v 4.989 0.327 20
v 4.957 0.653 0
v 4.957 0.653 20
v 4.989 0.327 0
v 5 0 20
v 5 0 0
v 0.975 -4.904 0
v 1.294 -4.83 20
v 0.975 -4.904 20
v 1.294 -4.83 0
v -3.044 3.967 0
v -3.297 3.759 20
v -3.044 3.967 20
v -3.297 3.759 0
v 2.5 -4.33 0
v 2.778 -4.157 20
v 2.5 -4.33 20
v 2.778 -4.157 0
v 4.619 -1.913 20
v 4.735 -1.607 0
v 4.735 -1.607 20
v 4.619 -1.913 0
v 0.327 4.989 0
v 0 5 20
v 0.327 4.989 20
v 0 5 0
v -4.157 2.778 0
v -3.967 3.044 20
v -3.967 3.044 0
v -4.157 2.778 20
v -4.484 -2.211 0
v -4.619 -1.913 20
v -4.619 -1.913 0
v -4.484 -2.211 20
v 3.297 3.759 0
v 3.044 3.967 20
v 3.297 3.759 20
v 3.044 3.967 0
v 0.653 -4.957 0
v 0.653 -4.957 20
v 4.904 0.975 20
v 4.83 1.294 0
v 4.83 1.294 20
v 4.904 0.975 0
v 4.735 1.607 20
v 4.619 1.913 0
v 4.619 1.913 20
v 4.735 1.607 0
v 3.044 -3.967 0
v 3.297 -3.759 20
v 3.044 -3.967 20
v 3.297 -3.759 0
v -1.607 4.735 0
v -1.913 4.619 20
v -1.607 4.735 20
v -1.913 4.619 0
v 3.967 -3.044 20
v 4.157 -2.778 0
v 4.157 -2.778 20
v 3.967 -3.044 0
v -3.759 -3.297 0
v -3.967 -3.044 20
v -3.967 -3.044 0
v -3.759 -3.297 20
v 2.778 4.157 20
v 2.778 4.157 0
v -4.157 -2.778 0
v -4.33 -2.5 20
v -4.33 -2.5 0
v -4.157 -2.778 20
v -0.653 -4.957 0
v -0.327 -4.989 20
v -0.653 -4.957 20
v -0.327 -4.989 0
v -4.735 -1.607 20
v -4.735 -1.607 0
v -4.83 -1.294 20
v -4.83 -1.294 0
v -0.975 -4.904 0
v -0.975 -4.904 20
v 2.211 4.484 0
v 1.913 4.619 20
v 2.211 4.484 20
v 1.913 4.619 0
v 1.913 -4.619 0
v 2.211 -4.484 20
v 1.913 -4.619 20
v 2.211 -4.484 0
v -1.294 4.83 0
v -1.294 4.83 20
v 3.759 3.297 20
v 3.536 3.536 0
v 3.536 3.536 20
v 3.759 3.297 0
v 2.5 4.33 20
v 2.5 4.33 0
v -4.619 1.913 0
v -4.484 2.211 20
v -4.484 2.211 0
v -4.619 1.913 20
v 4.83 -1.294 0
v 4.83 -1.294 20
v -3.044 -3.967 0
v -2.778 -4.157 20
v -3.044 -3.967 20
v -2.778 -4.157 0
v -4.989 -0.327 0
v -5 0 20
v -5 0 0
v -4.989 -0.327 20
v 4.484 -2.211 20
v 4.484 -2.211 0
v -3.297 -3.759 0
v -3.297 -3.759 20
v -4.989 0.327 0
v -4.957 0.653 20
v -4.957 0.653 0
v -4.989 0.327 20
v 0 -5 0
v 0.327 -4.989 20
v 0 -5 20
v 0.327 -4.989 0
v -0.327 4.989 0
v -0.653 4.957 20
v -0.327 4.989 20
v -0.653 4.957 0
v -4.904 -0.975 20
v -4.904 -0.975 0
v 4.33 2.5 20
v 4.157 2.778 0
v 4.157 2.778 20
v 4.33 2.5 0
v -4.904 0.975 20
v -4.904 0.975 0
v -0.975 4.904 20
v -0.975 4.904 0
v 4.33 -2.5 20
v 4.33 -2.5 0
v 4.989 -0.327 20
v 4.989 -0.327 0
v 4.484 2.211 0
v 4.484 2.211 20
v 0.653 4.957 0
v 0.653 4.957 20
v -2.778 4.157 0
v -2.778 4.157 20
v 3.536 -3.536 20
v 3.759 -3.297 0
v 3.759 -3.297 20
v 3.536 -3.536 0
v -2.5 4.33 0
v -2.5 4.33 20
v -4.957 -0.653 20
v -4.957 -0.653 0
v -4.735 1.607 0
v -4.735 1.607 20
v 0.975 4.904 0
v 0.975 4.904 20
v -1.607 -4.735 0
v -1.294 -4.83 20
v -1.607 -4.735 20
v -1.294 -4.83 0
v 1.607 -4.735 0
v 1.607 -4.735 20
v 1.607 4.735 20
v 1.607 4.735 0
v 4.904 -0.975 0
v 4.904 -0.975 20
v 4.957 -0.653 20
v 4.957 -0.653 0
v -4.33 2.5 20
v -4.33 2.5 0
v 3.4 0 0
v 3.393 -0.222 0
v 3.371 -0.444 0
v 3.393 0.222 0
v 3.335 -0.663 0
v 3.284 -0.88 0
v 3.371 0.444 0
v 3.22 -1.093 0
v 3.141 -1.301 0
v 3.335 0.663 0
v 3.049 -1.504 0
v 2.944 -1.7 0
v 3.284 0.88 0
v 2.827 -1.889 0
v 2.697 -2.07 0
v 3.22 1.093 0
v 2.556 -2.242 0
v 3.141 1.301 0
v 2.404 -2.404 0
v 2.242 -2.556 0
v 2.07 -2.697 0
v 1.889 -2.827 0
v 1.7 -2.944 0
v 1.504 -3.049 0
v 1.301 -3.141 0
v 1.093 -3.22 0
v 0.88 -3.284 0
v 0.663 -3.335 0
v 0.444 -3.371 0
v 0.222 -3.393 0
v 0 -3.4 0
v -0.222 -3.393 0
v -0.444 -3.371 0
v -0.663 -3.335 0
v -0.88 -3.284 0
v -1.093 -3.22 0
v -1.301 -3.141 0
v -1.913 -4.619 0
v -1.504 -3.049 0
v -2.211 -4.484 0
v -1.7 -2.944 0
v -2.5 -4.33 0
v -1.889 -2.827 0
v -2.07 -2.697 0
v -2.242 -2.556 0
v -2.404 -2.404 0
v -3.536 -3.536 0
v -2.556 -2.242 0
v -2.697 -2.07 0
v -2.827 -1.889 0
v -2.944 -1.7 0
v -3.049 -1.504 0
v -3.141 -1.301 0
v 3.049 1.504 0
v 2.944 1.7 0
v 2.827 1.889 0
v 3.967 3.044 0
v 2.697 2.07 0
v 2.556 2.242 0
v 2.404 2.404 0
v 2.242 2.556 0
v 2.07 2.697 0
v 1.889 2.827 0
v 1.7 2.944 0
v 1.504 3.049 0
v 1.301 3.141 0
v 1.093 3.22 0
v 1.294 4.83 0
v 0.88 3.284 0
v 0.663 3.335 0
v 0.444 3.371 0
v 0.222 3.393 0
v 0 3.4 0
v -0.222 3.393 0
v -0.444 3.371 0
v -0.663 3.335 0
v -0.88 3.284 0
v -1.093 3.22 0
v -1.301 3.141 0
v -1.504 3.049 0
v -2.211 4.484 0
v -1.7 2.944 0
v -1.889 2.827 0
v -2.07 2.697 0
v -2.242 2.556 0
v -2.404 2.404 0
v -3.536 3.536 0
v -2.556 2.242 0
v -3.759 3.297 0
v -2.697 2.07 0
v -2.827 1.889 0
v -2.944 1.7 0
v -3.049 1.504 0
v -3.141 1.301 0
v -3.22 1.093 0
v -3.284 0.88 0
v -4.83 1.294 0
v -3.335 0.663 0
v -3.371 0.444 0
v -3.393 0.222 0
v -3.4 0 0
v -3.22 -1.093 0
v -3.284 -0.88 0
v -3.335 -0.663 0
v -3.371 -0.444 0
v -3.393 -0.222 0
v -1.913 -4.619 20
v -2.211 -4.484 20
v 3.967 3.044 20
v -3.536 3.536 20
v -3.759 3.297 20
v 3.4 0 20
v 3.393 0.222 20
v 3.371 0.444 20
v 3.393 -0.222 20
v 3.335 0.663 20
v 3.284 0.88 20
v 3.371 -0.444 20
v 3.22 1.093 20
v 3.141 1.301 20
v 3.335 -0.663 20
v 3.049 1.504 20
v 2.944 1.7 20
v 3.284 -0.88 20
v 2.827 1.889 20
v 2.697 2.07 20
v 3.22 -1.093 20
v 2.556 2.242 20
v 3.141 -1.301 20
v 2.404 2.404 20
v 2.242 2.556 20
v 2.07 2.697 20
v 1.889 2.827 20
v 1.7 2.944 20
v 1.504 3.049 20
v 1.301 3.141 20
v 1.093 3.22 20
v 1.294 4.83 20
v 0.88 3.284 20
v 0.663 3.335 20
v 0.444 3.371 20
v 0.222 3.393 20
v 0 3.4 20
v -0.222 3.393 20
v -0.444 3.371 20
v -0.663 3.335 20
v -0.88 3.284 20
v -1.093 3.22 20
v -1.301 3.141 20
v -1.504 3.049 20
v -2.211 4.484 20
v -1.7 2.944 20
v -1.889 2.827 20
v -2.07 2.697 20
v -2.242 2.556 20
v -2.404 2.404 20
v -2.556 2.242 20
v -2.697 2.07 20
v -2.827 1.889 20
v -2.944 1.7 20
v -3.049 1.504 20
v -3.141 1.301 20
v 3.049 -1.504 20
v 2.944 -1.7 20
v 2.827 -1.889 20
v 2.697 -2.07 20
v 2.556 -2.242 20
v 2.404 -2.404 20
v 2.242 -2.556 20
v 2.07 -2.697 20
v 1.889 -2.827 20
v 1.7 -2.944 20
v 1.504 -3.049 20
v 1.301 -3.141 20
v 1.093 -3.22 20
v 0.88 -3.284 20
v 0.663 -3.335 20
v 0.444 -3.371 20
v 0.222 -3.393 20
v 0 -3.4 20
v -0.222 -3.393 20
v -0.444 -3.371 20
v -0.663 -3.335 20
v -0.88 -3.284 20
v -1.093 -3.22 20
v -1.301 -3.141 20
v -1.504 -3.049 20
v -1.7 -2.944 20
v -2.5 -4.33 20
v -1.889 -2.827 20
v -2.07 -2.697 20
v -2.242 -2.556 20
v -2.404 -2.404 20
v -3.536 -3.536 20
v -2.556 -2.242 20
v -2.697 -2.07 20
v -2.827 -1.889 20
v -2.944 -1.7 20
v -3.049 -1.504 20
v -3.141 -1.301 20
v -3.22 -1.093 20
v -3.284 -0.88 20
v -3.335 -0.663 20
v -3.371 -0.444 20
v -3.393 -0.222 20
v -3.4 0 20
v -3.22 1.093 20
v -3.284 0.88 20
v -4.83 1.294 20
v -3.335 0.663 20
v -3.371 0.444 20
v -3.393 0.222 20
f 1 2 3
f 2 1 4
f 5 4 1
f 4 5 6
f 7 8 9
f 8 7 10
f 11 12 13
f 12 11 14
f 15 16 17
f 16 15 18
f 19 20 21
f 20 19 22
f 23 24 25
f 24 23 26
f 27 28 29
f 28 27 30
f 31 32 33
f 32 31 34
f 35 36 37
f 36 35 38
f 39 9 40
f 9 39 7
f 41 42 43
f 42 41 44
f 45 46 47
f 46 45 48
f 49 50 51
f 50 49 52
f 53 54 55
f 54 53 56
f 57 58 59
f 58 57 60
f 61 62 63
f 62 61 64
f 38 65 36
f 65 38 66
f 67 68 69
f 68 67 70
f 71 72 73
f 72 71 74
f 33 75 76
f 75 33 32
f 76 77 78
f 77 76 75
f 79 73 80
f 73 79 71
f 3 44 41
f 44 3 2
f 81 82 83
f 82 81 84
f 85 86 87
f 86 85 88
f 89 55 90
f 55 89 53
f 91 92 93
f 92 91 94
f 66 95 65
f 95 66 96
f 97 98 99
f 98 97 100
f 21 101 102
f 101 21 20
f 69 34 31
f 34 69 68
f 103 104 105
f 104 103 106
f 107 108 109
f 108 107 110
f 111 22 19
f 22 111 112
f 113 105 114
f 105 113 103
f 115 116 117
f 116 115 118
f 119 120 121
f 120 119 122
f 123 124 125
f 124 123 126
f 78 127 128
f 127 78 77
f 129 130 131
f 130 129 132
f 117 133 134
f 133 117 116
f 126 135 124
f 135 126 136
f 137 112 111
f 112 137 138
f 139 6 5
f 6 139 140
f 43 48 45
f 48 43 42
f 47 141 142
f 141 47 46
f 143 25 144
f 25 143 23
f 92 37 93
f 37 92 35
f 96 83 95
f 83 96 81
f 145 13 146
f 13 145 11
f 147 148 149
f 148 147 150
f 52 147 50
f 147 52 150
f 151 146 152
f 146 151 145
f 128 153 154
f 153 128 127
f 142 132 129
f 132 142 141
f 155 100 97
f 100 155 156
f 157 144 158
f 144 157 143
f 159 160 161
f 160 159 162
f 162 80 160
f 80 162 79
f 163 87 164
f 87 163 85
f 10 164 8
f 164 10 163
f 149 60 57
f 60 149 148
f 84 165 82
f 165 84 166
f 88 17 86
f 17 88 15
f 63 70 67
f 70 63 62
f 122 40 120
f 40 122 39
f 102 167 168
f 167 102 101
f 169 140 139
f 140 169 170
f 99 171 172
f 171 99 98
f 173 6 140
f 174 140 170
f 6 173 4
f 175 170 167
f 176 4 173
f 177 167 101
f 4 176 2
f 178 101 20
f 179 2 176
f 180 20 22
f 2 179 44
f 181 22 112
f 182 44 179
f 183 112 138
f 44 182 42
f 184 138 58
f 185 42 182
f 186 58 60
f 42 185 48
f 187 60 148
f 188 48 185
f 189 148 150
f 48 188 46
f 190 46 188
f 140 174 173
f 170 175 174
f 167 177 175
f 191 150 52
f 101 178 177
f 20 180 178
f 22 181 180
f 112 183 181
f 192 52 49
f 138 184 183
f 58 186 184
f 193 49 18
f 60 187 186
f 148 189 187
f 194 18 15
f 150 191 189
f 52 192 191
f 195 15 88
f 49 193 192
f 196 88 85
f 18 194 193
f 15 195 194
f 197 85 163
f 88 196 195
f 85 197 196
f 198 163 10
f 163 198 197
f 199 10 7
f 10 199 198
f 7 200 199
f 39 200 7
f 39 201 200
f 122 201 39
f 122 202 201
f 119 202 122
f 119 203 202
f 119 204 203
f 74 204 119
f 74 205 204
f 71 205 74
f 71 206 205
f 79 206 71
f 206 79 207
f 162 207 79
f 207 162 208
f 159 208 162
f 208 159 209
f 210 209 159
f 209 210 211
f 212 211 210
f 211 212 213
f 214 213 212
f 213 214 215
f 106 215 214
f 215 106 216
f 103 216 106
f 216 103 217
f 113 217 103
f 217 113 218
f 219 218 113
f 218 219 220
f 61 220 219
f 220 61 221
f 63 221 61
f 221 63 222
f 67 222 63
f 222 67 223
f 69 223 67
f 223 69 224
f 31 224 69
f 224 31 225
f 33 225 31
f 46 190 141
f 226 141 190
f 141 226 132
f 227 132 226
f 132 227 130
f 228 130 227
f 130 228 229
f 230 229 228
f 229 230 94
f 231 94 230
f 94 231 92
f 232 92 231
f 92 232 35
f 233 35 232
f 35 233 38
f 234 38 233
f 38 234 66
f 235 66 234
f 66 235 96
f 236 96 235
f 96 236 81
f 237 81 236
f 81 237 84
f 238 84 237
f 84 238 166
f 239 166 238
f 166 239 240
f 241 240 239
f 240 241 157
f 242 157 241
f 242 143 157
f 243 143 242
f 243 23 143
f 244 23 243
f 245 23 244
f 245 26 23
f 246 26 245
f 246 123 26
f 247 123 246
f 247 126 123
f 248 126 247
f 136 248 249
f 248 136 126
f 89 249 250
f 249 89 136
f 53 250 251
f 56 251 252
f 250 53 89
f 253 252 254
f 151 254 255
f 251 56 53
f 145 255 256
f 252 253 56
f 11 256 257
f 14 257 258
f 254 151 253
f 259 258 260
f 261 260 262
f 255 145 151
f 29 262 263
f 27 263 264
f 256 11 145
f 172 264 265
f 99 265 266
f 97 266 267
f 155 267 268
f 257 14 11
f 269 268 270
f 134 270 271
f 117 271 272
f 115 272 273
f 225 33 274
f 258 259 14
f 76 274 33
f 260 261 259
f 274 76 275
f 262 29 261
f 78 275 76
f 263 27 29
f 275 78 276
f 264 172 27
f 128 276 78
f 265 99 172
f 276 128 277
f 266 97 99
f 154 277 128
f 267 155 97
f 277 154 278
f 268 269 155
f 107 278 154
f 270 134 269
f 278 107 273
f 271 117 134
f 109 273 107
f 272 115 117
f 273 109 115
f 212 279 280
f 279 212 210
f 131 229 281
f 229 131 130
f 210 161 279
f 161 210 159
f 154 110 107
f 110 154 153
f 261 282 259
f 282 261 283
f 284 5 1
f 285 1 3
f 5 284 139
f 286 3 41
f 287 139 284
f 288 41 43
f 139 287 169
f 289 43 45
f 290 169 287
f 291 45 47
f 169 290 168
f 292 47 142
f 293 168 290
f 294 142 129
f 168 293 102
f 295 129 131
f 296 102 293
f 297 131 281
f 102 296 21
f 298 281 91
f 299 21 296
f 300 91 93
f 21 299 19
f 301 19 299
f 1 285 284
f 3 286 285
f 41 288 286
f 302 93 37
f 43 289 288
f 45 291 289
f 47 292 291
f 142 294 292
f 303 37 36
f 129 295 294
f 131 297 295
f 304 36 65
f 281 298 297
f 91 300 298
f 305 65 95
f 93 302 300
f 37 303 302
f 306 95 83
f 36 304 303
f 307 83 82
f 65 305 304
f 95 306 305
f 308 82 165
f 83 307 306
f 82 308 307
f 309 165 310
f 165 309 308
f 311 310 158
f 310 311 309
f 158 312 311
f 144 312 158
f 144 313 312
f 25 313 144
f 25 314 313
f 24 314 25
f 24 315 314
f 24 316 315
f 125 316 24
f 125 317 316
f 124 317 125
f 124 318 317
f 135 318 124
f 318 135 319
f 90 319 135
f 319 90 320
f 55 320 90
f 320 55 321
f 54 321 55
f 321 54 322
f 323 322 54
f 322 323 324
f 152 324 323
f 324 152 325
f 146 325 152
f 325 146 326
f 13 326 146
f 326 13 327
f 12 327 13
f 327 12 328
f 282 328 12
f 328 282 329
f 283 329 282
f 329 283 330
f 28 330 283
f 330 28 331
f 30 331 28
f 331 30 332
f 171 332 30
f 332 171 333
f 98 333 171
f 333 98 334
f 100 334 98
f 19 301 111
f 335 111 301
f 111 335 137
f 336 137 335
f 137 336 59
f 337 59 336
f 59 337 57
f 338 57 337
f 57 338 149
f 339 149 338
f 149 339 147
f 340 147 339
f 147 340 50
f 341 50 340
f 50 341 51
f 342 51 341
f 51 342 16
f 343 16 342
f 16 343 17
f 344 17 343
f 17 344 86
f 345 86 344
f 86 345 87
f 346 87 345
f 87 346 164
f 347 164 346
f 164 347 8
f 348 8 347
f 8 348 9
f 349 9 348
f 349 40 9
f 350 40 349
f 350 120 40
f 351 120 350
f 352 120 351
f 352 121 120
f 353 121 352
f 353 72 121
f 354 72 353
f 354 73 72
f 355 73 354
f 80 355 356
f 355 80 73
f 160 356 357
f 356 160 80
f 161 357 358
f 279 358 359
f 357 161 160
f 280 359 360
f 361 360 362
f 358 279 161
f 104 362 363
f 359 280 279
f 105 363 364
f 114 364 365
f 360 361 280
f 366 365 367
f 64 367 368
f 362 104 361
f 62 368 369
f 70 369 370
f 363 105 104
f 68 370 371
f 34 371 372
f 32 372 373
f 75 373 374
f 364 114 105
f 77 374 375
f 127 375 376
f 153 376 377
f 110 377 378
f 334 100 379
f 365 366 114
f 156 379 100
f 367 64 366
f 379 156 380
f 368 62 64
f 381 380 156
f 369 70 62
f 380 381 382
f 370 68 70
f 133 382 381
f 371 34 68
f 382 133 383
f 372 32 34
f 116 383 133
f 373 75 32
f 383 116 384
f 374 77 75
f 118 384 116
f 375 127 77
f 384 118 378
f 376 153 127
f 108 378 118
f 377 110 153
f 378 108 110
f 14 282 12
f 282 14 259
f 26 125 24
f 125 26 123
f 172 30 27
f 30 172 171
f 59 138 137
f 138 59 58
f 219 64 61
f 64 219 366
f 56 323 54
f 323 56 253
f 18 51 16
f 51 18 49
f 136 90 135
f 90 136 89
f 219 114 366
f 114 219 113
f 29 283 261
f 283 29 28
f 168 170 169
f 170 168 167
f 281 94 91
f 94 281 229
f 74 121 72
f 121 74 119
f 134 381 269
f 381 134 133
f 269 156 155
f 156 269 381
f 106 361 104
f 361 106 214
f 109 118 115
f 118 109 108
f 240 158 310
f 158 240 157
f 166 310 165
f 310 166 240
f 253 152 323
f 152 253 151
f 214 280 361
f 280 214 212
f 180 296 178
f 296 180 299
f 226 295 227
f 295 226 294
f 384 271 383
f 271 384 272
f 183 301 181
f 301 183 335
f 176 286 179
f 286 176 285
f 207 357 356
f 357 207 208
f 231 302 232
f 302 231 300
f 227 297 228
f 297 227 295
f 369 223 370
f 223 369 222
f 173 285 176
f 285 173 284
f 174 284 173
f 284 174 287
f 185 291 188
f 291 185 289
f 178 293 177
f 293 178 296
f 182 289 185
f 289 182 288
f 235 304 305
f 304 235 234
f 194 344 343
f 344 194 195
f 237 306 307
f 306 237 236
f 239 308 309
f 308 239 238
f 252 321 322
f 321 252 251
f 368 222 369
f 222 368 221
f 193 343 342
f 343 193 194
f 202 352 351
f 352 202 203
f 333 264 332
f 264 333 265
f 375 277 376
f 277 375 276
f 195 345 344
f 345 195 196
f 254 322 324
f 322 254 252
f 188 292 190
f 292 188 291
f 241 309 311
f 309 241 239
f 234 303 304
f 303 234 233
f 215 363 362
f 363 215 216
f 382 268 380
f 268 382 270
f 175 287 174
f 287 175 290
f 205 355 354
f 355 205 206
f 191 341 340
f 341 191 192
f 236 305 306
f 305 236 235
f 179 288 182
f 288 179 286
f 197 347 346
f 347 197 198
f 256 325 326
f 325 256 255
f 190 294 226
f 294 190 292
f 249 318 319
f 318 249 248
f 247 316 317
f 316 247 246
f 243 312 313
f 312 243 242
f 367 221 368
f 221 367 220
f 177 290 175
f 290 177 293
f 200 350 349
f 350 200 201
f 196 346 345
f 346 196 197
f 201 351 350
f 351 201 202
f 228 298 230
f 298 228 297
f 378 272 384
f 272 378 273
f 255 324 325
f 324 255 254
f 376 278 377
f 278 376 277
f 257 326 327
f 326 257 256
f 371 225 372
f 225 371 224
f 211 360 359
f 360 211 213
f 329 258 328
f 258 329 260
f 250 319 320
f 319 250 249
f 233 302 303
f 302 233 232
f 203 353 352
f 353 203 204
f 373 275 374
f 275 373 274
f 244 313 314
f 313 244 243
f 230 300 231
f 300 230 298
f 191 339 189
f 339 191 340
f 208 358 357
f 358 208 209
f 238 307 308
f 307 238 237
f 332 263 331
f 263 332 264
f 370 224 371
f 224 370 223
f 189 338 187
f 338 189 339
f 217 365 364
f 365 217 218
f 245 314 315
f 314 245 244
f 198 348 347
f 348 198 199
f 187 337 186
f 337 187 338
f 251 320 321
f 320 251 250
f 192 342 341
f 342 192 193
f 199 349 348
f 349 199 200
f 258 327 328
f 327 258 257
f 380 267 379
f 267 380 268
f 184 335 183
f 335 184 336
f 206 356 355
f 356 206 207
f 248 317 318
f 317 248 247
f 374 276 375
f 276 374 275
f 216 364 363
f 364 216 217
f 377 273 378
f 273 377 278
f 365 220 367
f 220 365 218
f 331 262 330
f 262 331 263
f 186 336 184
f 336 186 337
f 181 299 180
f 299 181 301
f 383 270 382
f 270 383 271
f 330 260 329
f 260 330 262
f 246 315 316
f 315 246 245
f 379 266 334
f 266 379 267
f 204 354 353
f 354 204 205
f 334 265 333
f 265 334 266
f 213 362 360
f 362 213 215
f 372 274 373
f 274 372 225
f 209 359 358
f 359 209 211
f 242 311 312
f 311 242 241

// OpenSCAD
// Lab funnel - printed upright, wide opening at the top, open at both ends
// Units: mm. Straight spout (tube) from z = 0 to z = 20, then a cone
// widens to a 60 mm rim at z = 50. Wall thickness 1.6 mm everywhere.

// ---------------- Parameters ----------------
spout_d        = 10;    // spout outer diameter
spout_bore     = spout_d - 2 * 1.6;  // spout bore (6.8 mm)
spout_h        = 20;    // spout height (z = 0 to z = 20)
cone_top_d     = 10;    // cone top diameter, same as spout outer diameter
cone_bottom_d  = 60;    // cone rim diameter at the top (z = 50)
cone_h         = 50 - 20;  // cone height (z = 20 to z = 50)
wall           = 1.6;   // wall thickness, spout and cone
eps            = 0.5;   // cutter overshoot past faces

$fn = 96;               // smoothness for curved surfaces

// ---------------- Model ----------------
difference() {
    union() {
        // Spout: cylinder, z = 0 to z = 20
        cylinder(d = spout_d, h = spout_h);

        // Cone: 10 mm outer diameter at z = 20, 60 mm outer diameter at z = 50
        // (centre-to-centre height = cone_h = 30 mm)
        linear_extrude(height = cone_h)
            cylinder(d = cone_top_d, h = cone_h + 0.001);  // tiny overlap into spout
    }

    // Bore through the spout (constant 6.8 mm)
    translate([0, 0, -eps])
        cylinder(d = spout_bore, h = spout_h + 2 * eps);

    // Open top rim: cut the upper wall so the cone is open at z = 50
    translate([0, 0, spout_h + cone_h - wall - eps])
        cylinder(d = cone_bottom_d + 2 * eps, h = wall + 2 * eps);
}
